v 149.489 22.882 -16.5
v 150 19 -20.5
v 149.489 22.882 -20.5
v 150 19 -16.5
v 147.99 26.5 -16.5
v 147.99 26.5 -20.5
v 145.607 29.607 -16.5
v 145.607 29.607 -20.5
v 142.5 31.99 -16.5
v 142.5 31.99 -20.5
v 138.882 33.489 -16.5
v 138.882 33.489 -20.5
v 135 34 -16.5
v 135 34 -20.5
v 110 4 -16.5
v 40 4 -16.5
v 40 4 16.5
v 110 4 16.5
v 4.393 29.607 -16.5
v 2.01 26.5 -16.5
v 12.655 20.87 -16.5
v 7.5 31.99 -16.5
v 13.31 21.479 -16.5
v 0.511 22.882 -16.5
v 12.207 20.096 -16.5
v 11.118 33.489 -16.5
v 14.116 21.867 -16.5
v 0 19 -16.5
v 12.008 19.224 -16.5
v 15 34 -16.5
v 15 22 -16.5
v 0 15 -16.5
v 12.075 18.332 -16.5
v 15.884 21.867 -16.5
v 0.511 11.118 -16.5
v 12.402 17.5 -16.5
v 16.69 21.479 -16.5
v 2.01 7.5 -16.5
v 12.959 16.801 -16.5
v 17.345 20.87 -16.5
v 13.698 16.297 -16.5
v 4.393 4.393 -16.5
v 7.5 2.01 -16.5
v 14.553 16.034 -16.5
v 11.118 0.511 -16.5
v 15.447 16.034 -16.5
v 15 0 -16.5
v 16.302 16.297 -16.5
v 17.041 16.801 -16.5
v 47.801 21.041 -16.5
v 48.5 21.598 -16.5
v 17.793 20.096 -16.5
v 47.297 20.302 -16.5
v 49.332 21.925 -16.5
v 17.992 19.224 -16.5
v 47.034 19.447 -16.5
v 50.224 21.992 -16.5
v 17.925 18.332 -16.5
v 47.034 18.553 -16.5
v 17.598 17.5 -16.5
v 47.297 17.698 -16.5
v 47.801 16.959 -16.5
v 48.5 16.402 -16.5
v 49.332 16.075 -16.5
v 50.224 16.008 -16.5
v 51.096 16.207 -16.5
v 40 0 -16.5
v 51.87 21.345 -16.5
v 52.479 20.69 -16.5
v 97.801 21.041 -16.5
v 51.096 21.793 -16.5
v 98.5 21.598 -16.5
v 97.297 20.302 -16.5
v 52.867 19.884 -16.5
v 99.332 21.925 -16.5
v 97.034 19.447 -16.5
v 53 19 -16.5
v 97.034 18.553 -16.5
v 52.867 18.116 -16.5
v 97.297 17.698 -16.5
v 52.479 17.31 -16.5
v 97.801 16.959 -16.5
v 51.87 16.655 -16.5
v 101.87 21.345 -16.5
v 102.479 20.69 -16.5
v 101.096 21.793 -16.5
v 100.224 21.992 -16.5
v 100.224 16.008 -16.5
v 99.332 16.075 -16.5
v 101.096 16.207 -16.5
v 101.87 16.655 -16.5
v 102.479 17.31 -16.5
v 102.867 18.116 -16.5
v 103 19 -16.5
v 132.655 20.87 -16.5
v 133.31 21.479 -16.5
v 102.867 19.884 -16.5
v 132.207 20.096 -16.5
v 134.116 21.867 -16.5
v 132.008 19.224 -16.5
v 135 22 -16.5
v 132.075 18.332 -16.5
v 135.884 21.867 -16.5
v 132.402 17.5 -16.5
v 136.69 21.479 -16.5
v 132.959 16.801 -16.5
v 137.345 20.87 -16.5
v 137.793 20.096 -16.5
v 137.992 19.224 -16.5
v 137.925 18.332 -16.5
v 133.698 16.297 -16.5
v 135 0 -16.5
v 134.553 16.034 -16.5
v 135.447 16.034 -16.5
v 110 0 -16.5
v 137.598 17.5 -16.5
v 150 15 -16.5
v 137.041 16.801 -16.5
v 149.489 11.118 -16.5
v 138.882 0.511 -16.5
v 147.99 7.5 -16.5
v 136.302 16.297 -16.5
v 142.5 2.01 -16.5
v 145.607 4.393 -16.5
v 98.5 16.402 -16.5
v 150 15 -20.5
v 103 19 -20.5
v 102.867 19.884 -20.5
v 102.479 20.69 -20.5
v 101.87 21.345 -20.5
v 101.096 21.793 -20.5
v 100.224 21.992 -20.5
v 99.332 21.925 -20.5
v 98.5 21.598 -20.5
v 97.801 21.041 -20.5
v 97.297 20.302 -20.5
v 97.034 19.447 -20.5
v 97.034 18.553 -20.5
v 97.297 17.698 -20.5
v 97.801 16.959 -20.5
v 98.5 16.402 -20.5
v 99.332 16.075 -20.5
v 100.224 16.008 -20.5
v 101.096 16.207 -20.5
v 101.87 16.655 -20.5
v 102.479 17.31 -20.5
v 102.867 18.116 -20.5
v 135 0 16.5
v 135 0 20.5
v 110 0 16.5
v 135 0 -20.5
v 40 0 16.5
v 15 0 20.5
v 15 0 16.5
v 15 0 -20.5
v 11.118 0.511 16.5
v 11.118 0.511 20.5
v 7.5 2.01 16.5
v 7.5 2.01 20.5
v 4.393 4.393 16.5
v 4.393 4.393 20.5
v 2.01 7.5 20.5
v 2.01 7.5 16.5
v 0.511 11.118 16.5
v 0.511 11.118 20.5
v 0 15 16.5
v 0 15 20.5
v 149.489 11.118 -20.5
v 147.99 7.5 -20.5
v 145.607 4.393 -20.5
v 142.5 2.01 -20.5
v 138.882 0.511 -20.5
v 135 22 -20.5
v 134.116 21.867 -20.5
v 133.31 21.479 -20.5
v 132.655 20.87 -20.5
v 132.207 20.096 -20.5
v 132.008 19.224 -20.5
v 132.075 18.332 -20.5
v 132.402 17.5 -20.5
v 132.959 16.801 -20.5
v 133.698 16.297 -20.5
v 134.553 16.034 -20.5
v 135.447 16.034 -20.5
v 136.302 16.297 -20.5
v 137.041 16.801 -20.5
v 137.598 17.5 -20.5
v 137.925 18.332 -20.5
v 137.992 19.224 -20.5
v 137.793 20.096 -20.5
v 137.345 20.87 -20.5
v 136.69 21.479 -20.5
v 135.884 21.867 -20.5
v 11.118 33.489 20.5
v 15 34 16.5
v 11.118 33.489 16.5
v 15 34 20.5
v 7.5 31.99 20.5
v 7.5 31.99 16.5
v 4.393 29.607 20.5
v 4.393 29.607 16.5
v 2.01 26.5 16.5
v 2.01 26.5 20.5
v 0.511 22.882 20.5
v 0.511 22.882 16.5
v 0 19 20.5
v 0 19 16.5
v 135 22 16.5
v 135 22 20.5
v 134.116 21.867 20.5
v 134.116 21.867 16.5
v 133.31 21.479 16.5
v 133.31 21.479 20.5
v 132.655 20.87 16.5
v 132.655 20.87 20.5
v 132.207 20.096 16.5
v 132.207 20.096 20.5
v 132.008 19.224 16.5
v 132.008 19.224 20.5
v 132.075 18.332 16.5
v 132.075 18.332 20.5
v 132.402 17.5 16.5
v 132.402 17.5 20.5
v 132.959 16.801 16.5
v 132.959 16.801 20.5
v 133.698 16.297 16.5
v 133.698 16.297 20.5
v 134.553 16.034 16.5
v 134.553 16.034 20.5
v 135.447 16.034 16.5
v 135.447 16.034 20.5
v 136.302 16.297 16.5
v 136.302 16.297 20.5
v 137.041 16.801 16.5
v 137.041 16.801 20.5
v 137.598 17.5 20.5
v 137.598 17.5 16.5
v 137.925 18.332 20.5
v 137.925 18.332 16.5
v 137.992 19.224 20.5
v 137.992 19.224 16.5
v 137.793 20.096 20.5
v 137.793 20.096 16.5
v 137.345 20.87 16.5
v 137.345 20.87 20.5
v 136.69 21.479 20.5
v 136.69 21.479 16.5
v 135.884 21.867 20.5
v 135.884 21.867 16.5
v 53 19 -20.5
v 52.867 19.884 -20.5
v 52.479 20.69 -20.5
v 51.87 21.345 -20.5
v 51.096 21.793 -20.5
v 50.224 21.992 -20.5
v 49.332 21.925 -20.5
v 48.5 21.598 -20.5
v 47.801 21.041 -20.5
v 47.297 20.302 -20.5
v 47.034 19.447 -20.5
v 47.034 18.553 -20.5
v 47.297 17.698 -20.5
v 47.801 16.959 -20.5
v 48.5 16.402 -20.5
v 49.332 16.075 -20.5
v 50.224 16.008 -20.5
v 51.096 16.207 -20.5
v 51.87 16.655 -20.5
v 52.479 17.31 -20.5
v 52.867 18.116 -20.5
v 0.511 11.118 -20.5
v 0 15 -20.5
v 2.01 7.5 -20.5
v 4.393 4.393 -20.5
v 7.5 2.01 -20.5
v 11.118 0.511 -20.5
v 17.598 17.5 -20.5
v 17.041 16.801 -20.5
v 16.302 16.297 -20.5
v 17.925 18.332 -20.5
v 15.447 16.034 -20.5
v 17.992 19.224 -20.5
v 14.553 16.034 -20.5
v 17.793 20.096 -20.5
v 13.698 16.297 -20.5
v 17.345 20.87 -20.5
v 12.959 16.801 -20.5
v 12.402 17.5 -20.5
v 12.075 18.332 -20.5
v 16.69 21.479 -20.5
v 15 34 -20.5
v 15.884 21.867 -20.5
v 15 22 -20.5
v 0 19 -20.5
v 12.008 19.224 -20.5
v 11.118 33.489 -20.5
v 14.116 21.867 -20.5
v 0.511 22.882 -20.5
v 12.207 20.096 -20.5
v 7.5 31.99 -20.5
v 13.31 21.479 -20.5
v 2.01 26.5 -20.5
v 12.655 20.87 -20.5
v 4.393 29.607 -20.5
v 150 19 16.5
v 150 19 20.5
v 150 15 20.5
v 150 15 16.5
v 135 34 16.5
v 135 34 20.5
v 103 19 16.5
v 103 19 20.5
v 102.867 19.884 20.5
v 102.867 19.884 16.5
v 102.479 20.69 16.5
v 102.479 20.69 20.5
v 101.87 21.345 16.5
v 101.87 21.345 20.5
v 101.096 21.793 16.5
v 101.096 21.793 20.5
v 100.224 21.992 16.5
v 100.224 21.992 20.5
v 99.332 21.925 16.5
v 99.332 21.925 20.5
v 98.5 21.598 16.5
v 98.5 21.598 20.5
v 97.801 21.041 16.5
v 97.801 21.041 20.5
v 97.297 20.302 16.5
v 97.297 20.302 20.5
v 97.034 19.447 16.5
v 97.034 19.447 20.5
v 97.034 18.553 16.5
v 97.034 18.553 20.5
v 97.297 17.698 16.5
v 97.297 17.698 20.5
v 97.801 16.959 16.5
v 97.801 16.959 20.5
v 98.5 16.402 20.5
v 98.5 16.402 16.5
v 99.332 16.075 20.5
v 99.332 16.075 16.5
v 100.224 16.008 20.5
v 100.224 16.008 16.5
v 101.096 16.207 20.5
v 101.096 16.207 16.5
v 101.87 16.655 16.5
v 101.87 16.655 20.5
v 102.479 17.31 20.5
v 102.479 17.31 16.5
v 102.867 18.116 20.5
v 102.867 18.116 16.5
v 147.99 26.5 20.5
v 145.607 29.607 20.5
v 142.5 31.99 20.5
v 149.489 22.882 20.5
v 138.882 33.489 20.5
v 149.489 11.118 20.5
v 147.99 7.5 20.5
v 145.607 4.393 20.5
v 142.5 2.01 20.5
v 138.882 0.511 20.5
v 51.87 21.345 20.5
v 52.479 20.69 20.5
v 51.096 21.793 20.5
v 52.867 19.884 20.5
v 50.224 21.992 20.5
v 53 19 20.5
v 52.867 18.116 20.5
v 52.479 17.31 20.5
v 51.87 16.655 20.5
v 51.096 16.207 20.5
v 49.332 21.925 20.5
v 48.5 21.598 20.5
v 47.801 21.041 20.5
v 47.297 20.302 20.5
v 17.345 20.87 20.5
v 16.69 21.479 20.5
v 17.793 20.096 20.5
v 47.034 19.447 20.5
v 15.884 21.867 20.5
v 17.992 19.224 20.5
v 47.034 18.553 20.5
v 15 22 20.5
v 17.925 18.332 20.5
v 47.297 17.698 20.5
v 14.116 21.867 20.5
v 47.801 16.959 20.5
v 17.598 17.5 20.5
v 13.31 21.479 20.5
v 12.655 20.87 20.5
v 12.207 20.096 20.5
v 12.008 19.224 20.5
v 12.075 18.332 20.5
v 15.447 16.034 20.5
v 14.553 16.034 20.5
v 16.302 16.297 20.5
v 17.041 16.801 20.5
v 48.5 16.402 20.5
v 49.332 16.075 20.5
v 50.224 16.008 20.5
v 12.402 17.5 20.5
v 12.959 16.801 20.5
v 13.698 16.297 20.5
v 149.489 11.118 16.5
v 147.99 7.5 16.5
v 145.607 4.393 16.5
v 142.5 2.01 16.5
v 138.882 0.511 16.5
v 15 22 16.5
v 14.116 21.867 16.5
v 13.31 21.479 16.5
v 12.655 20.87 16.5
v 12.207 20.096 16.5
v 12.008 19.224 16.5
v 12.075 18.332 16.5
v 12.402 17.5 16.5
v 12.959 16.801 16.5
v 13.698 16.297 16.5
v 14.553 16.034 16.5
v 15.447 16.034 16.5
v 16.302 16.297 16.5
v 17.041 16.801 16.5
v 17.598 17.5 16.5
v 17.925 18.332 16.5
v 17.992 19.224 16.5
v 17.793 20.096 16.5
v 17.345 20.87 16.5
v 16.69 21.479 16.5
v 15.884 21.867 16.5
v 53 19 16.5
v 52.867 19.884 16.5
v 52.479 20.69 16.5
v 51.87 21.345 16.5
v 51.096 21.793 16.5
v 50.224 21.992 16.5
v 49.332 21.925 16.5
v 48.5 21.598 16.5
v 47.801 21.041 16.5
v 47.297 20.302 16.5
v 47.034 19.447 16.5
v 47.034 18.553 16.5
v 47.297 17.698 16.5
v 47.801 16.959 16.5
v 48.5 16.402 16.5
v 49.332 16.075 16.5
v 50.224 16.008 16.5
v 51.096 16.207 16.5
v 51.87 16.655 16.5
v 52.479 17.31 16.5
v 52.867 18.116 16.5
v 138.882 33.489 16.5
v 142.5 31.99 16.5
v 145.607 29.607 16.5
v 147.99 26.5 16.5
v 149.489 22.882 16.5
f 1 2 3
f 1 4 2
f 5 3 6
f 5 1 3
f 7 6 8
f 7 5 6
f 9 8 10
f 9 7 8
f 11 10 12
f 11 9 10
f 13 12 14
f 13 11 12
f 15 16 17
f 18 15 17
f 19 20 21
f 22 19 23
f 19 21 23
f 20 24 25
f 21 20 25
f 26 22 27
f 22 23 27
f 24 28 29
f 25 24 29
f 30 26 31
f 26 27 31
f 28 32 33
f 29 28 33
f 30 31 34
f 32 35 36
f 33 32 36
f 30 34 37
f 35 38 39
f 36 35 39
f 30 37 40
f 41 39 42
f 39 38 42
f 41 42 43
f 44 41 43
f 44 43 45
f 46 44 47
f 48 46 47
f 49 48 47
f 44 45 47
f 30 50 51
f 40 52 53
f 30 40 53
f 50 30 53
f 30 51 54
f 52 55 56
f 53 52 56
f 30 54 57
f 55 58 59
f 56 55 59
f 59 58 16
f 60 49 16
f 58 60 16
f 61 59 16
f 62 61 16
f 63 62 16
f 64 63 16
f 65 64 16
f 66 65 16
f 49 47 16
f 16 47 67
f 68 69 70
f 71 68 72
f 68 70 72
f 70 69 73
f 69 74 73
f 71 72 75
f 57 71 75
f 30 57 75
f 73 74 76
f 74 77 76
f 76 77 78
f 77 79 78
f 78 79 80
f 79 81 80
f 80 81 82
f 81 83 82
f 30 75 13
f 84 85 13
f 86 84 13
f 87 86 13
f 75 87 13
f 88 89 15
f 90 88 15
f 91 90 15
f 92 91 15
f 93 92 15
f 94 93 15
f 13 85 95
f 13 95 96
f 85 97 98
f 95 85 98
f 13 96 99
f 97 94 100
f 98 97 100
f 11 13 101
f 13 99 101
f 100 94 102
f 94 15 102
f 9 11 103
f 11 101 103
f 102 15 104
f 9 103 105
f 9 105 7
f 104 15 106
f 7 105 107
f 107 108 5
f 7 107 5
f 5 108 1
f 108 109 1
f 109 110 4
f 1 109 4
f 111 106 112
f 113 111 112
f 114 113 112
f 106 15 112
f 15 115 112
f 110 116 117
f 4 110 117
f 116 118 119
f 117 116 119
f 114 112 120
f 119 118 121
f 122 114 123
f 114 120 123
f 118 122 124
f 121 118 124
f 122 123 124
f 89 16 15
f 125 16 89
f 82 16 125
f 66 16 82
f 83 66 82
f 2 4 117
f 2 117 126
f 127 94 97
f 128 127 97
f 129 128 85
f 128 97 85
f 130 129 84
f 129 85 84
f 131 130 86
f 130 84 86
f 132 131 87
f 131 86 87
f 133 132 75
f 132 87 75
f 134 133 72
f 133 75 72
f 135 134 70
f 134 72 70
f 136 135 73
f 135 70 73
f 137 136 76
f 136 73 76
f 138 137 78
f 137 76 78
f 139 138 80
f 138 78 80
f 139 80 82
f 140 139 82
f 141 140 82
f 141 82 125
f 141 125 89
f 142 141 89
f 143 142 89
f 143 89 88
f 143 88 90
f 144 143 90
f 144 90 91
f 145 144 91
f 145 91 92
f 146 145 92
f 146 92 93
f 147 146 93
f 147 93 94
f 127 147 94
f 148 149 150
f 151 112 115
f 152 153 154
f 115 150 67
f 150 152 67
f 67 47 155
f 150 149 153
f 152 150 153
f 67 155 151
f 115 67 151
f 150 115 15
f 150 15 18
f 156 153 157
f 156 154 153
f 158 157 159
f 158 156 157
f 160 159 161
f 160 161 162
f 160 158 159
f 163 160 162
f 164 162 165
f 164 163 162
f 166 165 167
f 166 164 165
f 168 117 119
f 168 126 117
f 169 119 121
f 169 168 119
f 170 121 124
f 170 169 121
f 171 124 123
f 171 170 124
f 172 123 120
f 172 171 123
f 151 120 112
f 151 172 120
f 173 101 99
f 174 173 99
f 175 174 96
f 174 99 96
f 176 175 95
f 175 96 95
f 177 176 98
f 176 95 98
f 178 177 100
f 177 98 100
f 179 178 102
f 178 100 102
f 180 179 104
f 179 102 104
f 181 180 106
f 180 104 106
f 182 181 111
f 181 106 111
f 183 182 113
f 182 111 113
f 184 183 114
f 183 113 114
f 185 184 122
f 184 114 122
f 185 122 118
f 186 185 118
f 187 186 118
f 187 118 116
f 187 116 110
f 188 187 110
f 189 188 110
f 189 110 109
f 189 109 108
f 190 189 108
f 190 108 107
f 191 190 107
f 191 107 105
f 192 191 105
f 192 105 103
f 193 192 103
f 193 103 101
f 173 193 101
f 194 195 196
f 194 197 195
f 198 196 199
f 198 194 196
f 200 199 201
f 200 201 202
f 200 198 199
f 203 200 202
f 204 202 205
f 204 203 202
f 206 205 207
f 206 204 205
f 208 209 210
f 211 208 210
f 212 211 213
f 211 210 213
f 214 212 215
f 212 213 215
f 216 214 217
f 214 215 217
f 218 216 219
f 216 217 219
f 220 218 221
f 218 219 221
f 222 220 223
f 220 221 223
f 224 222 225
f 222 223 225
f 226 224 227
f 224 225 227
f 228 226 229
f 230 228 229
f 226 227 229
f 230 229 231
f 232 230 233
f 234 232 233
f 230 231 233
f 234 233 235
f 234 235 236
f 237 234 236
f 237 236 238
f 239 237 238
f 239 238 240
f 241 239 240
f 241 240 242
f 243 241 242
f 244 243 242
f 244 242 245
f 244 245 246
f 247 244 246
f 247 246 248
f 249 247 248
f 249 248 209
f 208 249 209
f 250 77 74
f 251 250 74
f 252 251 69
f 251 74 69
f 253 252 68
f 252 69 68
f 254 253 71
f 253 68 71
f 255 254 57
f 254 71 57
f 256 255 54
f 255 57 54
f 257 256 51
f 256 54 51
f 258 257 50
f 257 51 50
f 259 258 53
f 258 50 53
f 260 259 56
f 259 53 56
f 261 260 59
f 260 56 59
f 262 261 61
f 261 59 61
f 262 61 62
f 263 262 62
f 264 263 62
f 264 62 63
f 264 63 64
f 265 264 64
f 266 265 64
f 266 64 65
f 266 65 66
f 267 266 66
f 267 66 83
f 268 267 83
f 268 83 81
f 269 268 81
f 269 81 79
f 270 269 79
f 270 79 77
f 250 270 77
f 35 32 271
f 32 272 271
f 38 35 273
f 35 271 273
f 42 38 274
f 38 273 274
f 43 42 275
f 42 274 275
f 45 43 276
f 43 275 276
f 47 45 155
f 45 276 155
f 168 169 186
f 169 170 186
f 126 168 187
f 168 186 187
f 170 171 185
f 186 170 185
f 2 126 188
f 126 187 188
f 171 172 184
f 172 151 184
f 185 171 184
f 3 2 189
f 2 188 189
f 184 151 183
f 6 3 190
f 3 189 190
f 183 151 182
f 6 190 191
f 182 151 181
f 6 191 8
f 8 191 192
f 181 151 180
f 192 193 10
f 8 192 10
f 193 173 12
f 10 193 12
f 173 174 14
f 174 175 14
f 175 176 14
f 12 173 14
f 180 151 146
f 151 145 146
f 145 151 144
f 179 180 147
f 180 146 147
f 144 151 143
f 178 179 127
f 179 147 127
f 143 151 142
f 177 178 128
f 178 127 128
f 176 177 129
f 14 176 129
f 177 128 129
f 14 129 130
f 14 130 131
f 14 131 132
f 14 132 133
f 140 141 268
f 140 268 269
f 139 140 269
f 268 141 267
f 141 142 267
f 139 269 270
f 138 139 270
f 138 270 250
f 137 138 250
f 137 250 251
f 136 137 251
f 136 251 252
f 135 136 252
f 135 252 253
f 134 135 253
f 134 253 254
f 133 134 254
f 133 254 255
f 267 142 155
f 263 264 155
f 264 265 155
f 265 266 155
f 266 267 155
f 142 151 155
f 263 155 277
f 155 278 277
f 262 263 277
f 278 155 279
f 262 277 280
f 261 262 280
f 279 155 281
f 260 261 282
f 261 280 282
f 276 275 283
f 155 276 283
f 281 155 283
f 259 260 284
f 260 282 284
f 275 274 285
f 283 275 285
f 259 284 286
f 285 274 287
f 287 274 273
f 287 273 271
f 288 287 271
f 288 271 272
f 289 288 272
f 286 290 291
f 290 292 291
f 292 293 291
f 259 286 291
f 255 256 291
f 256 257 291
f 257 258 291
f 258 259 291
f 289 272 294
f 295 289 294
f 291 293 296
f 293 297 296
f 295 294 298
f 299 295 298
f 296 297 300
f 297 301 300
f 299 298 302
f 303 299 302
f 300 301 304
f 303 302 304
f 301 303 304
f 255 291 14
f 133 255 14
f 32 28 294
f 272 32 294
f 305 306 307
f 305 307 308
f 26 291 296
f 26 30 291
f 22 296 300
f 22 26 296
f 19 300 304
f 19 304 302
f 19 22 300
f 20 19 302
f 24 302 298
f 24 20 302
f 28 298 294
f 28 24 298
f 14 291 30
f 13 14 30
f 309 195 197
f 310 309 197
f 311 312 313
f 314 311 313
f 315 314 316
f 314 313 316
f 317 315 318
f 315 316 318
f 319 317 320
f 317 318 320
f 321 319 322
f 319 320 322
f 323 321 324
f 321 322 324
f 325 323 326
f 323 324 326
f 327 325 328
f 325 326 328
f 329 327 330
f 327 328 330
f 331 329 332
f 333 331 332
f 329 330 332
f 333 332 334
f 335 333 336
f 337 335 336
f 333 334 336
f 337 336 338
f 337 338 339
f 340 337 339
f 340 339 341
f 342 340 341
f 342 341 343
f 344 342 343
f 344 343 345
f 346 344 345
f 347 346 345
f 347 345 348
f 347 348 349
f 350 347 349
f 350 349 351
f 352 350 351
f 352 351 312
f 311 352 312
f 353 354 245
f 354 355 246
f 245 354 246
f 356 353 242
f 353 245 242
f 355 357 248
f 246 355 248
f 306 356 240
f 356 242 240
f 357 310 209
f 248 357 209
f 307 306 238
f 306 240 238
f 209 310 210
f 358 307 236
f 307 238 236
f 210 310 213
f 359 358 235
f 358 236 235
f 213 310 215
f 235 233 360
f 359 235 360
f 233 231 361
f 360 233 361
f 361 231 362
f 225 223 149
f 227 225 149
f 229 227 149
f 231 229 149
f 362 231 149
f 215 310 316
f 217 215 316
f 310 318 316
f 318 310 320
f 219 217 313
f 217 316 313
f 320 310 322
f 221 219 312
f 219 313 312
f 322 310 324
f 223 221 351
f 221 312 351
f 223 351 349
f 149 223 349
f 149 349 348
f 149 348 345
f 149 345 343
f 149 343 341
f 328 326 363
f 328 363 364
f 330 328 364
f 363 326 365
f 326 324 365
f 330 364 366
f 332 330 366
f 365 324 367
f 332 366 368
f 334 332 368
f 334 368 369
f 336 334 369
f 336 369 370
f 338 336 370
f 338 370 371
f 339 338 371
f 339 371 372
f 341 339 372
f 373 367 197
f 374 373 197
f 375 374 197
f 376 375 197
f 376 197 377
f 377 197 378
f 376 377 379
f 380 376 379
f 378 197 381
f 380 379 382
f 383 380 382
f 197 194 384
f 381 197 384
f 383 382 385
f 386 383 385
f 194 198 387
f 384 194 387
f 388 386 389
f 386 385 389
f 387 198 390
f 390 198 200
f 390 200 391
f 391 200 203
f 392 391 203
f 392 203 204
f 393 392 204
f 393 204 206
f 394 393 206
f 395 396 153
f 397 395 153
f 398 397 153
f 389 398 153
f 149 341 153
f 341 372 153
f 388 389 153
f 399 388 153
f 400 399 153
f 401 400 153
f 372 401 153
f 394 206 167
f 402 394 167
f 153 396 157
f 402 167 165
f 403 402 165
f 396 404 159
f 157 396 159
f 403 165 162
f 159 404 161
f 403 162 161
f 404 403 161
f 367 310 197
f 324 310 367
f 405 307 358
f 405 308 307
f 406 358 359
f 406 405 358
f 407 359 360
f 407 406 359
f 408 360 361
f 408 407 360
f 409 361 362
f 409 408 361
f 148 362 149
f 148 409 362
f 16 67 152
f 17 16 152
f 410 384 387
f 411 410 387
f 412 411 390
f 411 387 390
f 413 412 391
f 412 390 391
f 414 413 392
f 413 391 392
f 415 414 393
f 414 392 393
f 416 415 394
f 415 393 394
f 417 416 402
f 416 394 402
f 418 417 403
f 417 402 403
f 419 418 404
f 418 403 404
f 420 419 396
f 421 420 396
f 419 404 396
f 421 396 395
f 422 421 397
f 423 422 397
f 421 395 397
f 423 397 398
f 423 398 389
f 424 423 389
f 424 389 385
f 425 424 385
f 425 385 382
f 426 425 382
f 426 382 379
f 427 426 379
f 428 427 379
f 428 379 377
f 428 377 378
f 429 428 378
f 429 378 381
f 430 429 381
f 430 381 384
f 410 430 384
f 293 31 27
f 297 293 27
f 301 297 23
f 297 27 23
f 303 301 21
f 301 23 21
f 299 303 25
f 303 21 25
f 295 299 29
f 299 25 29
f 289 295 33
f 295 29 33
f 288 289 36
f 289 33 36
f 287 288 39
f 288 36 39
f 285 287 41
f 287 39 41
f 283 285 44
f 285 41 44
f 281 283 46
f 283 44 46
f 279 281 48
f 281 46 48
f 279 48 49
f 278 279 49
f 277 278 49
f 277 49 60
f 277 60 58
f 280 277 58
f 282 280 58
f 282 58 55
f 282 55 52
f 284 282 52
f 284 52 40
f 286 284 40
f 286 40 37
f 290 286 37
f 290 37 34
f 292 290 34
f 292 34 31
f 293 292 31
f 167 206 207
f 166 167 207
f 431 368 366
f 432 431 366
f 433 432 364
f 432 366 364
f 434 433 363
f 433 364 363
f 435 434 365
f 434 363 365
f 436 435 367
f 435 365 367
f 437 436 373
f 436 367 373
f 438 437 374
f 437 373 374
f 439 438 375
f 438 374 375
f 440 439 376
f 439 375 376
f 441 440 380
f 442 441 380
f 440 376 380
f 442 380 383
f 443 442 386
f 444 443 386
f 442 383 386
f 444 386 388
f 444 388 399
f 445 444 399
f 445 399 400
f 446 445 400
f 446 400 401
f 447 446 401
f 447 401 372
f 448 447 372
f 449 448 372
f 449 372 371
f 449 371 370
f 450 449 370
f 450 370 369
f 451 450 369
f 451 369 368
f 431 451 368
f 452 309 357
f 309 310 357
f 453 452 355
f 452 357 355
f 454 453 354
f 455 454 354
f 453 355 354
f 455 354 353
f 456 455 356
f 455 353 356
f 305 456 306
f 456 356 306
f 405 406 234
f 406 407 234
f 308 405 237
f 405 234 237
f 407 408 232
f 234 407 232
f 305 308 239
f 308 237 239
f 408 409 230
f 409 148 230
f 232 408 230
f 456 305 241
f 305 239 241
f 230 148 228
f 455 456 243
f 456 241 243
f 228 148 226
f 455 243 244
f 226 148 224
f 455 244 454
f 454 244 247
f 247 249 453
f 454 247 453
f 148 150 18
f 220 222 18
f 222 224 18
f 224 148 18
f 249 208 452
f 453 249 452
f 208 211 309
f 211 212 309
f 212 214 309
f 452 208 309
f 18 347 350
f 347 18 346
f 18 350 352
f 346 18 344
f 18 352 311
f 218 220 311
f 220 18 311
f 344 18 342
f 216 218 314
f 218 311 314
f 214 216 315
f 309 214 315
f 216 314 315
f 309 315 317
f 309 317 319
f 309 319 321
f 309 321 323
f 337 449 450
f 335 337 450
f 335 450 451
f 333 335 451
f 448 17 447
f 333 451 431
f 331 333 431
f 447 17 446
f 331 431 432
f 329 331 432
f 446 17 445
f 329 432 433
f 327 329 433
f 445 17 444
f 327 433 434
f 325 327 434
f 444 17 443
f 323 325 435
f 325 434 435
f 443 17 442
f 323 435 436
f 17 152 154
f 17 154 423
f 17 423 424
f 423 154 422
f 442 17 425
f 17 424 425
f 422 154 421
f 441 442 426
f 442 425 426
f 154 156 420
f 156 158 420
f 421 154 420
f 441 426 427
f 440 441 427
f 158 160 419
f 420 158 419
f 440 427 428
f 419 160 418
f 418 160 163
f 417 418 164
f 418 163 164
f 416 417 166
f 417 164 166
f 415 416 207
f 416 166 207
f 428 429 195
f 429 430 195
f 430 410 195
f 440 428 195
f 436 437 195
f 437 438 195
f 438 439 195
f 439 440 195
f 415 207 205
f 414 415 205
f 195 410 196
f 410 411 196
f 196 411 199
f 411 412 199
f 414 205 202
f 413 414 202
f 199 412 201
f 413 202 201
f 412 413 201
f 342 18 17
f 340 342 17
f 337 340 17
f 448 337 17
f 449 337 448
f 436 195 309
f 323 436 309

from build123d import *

# Parameters (mm, degrees)
EXTRUDE_1_DEPTH     = 150
SKETCH_2_R          = 3
CUT_EXTRUDE_1_DEPTH = 300
SKETCH_3_W          = 40
SKETCH_3_H          = 33
CUT_EXTRUDE_2_DEPTH = 10
FILLET_1_R          = 15
SKETCH_4_R          = 3
CUT_EXTRUDE_3_DEPTH = 160.176003217


with BuildPart() as part:
    # 草图1 → 凸台-拉伸1 (new body)
    with BuildSketch(Plane(origin=(0, 0, 0), x_dir=(0, 0, -1), z_dir=(1, 0, 0))):
        Polygon((-16.5, 4), (-16.5, 34), (-20.5, 34), (-20.5, 0), (0, 0), (0, 4), align=None)
        Polygon((16.5, 4), (0, 4), (0, 0), (20.5, 0), (20.5, 34), (16.5, 34), align=None)
    extrude(amount=EXTRUDE_1_DEPTH)

    # 草图2 → 切除-拉伸1 (cut)
    with BuildSketch(Plane.XY.offset(20.5)):
        with Locations(Location((15, 19, 0), (0, 0, 90))):
            Circle(SKETCH_2_R)
        with Locations(Location((135, 19, 0), (0, 0, 90))):
            Circle(SKETCH_2_R)
    extrude(amount=-CUT_EXTRUDE_1_DEPTH, mode=Mode.SUBTRACT)

    # 草图3 → 切除-拉伸2 (cut)
    with BuildSketch(Plane.XZ):
        with Locations((130, 0)):
            Rectangle(SKETCH_3_W, SKETCH_3_H)
        with Locations((20, 0)):
            Rectangle(SKETCH_3_W, SKETCH_3_H)
    extrude(amount=-CUT_EXTRUDE_2_DEPTH, mode=Mode.SUBTRACT)

    # 圆角1
    fillet_1_edges = [part.edges().sort_by_distance(p)[0] for p in [
        (0, 0, 18.5),
        (0, 34, 18.5),
        (150, 34, 18.5),
        (150, 0, 18.5),
        (150, 34, -18.5),
        (150, 0, -18.5),
        (0, 0, -18.5),
        (0, 34, -18.5),
    ]]
    fillet(fillet_1_edges, radius=FILLET_1_R)

    # 草图4 → 切除-拉伸3 (cut, through all)
    with BuildSketch(Plane.XY.offset(20.5)):
        with Locations((50, 19)):
            Circle(SKETCH_4_R)
        with Locations((100, 19)):
            Circle(SKETCH_4_R)
    extrude(amount=-CUT_EXTRUDE_3_DEPTH, mode=Mode.SUBTRACT)


solid = part.part
